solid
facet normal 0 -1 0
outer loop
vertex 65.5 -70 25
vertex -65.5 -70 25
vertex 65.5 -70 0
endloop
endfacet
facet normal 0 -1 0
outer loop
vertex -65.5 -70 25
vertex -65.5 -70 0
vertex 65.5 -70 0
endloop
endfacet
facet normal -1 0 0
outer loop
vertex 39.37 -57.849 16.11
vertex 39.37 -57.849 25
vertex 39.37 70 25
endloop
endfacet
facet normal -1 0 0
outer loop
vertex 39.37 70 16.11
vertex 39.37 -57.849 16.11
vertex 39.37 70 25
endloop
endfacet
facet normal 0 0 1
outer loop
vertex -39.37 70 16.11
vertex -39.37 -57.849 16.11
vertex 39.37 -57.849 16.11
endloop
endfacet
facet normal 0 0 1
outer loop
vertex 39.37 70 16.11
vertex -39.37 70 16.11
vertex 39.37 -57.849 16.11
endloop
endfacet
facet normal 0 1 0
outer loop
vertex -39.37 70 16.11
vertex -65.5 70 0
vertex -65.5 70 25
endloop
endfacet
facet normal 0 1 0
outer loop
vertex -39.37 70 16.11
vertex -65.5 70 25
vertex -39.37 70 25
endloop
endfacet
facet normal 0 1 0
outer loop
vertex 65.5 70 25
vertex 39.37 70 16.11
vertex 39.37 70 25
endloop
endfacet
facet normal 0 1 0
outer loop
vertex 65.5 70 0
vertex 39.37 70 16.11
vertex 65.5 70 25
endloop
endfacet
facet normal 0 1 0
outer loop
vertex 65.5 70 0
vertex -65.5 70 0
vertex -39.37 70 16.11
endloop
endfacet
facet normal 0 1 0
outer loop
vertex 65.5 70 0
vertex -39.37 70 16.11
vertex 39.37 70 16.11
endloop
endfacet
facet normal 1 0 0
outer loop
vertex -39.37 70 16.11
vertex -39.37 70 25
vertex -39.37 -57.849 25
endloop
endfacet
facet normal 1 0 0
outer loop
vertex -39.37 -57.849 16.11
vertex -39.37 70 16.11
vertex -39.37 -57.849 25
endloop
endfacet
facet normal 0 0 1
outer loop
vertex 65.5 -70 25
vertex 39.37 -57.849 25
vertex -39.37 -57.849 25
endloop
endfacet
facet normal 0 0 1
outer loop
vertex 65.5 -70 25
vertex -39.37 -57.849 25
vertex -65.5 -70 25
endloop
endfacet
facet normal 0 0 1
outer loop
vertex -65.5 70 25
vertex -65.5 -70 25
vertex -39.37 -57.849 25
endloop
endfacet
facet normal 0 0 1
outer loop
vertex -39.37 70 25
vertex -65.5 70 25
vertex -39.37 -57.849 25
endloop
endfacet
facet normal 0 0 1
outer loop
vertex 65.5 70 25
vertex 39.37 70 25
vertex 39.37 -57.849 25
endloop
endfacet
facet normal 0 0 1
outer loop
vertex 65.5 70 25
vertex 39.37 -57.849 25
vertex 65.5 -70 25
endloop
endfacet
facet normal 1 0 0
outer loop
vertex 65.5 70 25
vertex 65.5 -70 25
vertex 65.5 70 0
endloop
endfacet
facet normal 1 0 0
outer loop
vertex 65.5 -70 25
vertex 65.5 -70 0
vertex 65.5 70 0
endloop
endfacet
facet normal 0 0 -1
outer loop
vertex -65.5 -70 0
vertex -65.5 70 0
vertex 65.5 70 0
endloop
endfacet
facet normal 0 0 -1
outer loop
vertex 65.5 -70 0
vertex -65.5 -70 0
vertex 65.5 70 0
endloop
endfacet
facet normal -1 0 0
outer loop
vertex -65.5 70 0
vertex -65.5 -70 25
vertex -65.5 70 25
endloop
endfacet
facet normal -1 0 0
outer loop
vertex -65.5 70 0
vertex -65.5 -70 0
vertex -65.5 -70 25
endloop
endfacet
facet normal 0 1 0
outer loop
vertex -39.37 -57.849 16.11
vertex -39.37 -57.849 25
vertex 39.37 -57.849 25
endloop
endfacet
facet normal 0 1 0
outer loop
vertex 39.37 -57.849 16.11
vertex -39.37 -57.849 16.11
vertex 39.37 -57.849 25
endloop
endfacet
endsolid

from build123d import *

# Parameters (mm, degrees)
F1_DEPTH  = 15
F1_FACE_W = 131
F1_FACE_H = 140
F2_DEPTH  = 10
F4_DEPTH  = 8.89


with BuildPart() as f1:
    # F0 (on Top) → F1 (new body)
    with BuildSketch(Plane.XY):
        Polygon((-65.5, 70), (-65.5, 0), (-65.5, -70), (0, -70), (65.5, -70), (65.5, -69.559447), (65.5, 0), (65.5, 70), (0, 70), align=None)
    extrude(amount=F1_DEPTH)

    # F1_face (on face) → F2 (join)
    with BuildSketch(Plane.XY.offset(15)):
        Rectangle(F1_FACE_W, F1_FACE_H)
    extrude(amount=F2_DEPTH)

    # F3 (on face) → F4 (cut)
    with BuildSketch(Plane.XY.offset(25)):
        Polygon((39.37, 70), (0, 70), (-39.37, 70), (-39.37, -57.848956), (0, -57.848956), (39.37, -57.848956), align=None)
    extrude(amount=-F4_DEPTH, mode=Mode.SUBTRACT)


solid = f1.part
